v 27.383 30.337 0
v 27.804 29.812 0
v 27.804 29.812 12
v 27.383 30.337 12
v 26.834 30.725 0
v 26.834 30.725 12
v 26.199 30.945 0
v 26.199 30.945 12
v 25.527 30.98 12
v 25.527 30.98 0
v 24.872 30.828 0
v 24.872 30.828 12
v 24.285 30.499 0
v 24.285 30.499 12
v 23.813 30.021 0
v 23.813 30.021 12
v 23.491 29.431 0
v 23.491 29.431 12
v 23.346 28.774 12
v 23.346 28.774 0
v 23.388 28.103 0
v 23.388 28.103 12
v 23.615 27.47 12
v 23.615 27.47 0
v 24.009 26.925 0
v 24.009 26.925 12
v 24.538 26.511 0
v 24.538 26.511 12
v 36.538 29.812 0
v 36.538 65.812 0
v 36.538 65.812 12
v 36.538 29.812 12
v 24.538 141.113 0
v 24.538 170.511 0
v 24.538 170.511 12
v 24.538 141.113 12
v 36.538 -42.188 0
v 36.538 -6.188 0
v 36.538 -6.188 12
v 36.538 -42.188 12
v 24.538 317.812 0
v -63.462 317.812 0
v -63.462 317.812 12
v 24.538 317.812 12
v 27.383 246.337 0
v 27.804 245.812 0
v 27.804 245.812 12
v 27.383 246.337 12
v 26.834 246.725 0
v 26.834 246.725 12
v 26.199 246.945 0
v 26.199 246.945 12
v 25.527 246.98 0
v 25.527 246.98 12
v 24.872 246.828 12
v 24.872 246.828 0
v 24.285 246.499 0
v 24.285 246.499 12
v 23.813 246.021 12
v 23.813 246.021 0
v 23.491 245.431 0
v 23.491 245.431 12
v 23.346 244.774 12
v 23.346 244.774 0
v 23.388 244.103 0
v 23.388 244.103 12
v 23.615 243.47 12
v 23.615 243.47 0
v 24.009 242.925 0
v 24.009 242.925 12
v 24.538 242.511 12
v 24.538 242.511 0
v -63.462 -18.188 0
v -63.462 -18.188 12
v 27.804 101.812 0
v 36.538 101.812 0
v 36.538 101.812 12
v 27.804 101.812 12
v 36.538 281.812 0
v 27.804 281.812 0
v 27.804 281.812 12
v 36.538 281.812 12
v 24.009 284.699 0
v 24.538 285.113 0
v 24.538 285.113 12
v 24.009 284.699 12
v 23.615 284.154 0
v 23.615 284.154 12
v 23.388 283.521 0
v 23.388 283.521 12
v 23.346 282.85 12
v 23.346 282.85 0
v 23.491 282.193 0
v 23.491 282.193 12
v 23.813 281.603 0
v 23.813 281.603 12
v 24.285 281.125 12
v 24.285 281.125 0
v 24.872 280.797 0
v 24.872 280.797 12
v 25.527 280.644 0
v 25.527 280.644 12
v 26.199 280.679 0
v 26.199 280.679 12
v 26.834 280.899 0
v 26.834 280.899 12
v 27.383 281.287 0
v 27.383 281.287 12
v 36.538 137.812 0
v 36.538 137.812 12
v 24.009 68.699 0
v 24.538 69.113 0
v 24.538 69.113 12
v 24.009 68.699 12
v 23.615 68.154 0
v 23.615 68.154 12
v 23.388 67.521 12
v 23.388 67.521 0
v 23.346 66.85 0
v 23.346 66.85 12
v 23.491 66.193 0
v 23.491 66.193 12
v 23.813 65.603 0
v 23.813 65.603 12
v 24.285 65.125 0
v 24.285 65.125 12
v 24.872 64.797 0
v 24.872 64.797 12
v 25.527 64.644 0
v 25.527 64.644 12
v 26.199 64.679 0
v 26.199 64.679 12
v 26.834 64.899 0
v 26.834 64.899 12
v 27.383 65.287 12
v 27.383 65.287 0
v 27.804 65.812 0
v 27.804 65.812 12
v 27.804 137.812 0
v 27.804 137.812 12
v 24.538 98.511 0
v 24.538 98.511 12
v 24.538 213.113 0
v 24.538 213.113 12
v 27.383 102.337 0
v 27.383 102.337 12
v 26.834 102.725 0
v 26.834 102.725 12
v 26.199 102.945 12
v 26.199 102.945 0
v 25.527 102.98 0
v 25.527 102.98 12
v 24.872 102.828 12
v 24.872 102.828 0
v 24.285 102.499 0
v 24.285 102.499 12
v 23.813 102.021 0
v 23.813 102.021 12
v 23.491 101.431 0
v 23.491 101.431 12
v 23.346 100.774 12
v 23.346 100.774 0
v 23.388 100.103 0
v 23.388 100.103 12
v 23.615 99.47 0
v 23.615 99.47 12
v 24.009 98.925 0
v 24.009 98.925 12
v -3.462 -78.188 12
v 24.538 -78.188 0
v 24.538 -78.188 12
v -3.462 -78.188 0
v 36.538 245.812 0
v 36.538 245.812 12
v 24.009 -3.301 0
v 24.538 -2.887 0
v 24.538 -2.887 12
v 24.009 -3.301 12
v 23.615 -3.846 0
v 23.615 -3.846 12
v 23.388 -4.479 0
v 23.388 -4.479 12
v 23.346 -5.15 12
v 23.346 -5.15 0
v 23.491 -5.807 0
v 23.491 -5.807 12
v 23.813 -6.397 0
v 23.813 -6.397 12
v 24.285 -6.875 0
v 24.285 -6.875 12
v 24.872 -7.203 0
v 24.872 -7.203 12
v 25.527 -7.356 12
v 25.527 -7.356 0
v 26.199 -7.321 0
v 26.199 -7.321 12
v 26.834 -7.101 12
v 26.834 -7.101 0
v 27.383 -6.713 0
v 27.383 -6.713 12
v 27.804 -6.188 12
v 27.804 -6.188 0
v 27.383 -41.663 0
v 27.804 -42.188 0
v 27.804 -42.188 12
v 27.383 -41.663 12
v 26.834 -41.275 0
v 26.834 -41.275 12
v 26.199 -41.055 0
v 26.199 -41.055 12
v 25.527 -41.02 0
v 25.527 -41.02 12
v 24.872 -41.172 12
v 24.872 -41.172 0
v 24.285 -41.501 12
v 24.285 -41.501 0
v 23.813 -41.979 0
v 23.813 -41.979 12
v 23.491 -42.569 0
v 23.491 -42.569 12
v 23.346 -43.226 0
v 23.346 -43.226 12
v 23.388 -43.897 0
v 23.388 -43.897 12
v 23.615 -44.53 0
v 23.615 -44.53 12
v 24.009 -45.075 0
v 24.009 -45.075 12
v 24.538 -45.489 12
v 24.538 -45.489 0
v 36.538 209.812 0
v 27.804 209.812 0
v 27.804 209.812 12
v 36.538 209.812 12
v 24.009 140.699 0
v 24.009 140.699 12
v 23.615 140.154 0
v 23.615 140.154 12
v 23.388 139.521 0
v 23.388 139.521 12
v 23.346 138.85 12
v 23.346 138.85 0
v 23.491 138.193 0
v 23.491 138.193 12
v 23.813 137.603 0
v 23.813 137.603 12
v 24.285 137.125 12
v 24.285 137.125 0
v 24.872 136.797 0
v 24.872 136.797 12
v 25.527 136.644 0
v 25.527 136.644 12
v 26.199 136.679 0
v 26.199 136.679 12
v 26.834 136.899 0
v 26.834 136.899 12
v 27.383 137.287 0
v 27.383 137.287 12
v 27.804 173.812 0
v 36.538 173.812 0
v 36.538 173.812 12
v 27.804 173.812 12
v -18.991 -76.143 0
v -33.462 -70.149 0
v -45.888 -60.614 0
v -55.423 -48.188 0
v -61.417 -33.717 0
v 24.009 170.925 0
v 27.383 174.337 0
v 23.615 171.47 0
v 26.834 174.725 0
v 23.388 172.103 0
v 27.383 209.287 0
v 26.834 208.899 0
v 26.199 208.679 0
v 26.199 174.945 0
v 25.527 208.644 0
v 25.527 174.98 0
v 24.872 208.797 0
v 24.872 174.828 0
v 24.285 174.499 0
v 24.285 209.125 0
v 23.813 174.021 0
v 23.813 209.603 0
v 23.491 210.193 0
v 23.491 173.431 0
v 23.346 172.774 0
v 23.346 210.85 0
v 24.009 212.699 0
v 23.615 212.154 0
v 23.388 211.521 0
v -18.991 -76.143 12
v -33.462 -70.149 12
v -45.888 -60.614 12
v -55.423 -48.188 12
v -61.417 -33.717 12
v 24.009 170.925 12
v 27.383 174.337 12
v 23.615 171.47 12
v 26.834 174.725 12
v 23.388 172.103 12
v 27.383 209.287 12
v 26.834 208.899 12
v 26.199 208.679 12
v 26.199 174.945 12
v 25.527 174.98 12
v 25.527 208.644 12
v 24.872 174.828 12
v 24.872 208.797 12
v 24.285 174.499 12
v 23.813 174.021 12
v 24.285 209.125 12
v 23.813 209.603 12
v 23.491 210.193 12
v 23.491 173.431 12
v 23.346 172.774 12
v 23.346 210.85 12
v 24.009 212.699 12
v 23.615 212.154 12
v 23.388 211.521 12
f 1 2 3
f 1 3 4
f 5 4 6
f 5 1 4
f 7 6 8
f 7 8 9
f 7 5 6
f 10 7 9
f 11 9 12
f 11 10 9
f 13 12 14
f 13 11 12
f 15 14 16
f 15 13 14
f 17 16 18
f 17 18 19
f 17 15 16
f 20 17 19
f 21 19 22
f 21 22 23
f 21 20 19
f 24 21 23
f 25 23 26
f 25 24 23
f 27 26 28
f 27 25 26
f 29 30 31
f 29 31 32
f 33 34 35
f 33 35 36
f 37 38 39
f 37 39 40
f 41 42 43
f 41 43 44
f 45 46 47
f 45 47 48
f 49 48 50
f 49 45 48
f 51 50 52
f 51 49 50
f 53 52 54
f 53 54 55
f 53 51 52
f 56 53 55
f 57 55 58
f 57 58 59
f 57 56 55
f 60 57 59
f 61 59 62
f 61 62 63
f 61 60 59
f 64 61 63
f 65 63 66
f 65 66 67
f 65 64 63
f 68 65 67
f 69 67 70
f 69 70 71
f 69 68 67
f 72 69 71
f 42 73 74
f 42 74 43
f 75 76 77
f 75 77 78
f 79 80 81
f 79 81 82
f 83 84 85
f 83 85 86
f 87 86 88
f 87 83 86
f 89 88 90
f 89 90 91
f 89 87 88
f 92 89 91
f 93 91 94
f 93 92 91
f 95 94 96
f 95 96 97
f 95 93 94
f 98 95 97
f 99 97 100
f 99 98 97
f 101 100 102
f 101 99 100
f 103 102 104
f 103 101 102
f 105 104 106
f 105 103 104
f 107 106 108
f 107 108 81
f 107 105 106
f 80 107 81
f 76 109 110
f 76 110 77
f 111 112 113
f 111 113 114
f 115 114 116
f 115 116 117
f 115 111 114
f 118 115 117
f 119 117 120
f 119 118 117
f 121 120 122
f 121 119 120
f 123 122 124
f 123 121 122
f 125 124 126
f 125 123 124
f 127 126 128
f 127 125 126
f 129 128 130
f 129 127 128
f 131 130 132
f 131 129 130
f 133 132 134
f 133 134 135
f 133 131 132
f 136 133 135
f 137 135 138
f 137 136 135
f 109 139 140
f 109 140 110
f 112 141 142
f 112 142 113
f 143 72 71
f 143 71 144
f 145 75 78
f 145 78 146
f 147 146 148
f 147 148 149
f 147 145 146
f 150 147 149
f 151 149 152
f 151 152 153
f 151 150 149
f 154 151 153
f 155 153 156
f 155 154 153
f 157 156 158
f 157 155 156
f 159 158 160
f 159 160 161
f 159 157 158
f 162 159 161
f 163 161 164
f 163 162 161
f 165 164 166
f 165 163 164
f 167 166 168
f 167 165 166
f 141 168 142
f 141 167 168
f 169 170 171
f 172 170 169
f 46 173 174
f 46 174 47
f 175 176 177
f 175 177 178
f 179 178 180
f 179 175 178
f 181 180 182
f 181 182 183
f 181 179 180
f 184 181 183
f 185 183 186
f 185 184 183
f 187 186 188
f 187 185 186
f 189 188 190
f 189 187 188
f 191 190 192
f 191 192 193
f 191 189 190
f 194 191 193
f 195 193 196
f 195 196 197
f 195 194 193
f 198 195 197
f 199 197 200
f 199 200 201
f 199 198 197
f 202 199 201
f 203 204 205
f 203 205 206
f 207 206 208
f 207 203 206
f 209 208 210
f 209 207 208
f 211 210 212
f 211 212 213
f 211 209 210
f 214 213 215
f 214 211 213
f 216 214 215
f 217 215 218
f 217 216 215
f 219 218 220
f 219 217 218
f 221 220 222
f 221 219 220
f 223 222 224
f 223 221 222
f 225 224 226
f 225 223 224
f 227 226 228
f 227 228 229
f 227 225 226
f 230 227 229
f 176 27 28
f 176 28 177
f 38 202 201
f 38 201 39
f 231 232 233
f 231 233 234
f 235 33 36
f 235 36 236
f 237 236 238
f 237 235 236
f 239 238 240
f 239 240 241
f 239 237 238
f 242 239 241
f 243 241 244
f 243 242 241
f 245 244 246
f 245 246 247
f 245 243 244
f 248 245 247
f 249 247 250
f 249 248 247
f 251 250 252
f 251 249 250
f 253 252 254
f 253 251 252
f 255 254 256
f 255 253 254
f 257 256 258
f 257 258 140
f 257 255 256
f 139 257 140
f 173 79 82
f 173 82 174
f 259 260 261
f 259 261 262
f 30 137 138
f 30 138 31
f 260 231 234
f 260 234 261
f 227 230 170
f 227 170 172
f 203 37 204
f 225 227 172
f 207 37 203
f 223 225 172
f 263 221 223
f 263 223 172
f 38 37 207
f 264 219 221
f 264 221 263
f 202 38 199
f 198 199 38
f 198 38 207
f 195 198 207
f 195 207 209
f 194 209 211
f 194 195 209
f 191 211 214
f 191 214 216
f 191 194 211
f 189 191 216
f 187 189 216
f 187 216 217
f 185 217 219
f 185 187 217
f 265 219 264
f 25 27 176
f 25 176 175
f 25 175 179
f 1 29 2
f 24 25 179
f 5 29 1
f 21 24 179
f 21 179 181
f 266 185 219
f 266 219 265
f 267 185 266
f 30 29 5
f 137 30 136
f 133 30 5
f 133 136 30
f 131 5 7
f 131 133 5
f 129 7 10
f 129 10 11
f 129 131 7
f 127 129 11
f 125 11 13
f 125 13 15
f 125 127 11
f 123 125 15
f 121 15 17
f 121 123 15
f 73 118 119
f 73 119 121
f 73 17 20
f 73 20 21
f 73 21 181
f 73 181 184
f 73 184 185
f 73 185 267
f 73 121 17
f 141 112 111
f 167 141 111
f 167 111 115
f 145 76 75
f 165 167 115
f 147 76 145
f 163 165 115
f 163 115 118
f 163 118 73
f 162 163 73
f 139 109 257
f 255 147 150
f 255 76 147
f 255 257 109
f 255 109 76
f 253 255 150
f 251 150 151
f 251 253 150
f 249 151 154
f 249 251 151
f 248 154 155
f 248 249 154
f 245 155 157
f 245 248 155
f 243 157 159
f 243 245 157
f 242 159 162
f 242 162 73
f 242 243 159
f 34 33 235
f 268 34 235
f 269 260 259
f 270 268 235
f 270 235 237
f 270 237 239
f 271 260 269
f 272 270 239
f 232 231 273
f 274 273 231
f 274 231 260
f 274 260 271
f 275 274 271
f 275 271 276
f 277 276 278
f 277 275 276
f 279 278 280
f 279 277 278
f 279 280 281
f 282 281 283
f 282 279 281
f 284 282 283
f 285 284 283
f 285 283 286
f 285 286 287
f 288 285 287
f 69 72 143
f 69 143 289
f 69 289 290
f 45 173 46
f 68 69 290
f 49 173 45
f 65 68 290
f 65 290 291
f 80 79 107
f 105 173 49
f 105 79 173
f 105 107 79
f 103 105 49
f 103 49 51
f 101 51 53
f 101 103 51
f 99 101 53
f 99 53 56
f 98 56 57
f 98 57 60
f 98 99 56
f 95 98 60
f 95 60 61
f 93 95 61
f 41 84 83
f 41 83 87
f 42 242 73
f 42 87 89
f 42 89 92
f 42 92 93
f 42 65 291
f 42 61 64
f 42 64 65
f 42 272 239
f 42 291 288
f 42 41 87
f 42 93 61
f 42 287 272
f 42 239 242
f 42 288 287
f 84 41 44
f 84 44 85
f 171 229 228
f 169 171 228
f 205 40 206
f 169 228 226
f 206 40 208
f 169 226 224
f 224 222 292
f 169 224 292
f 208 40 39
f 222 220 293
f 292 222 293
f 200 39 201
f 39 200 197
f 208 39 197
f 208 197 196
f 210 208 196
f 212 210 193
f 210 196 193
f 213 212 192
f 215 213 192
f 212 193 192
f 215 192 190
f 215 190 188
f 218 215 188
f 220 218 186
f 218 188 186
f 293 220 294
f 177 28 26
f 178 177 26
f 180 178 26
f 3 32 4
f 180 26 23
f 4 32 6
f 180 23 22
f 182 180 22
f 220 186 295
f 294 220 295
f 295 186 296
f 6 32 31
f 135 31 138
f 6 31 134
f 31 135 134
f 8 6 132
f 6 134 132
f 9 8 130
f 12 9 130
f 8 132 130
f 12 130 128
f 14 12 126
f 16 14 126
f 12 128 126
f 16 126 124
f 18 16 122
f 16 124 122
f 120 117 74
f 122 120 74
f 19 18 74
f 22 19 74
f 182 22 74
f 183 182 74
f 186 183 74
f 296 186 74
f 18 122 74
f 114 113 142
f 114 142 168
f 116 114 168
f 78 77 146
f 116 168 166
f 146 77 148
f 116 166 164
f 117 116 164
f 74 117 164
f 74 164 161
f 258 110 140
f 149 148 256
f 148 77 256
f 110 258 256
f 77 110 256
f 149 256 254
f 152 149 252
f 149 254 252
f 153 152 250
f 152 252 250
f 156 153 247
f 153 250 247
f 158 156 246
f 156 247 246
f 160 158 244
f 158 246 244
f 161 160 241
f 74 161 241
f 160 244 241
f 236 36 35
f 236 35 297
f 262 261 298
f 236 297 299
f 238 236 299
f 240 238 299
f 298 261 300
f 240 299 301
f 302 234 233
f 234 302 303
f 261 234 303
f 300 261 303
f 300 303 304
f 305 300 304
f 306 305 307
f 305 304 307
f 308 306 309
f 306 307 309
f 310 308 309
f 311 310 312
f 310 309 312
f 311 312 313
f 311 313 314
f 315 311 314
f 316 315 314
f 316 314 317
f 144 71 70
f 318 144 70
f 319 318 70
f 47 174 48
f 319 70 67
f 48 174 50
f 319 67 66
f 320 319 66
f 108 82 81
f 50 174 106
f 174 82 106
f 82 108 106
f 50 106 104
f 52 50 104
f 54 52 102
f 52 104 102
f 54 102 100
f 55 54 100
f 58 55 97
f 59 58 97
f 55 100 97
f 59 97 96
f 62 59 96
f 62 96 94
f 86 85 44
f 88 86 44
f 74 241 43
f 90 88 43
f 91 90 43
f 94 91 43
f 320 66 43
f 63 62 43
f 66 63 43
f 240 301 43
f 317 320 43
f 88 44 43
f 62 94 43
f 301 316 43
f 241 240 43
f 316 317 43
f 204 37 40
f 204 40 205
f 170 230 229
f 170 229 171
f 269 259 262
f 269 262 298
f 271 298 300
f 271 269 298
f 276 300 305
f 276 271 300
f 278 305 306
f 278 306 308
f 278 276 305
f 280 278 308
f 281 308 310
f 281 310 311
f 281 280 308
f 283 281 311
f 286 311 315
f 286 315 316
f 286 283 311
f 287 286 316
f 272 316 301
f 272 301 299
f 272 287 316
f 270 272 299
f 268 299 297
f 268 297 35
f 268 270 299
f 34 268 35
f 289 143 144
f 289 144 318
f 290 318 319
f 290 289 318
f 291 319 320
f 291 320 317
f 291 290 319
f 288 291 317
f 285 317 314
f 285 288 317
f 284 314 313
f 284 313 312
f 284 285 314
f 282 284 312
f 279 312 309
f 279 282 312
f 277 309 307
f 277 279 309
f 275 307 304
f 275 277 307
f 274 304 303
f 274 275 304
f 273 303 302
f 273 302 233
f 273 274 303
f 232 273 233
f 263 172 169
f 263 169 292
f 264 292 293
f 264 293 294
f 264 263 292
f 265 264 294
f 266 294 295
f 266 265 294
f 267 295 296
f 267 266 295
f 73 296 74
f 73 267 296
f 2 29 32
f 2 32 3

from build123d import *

# Parameters (mm, degrees)
BOSS_EXTRUDE1_DEPTH = 12


with BuildPart() as part:
    # Sketch1 → Boss-Extrude1 (new body)
    with BuildSketch(Plane.XY):
        with BuildLine():
            Line((36.538461538, -42.187912088), (27.803617527, -42.187912088))
            ThreePointArc((27.803617527, -42.187912088), (24.032111316, -41.72295633), (24.538461538, -45.489128447))
            Line((24.538461538, -45.489128447), (24.538461538, -78.187912088))
            Line((24.538461538, -78.187912088), (-3.461538462, -78.187912088))
            ThreePointArc((-3.461538462, -78.187912088), (-45.887945333, -60.614318959), (-63.461538462, -18.187912088))
            Line((-63.461538462, -18.187912088), (-63.461538462, 317.812087912))
            Line((-63.461538462, 317.812087912), (24.538461538, 317.812087912))
            Line((24.538461538, 317.812087912), (24.538461538, 285.113304271))
            ThreePointArc((24.538461538, 285.113304271), (24.032111316, 281.347132154), (27.803617527, 281.812087912))
            Line((27.803617527, 281.812087912), (36.538461538, 281.812087912))
            Line((36.538461538, 281.812087912), (36.538461538, 245.812087912))
            Line((36.538461538, 245.812087912), (27.803617527, 245.812087912))
            ThreePointArc((27.803617527, 245.812087912), (24.032111316, 246.27704367), (24.538461538, 242.510871553))
            Line((24.538461538, 242.510871553), (24.538461538, 213.113304271))
            ThreePointArc((24.538461538, 213.113304271), (24.032111316, 209.347132154), (27.803617527, 209.812087912))
            Line((27.803617527, 209.812087912), (36.538461538, 209.812087912))
            Line((36.538461538, 209.812087912), (36.538461538, 173.812087912))
            Line((36.538461538, 173.812087912), (27.803617527, 173.812087912))
            ThreePointArc((27.803617527, 173.812087912), (24.032111316, 174.27704367), (24.538461538, 170.510871553))
            Line((24.538461538, 170.510871553), (24.538461538, 164.212087912))
            Line((24.538461538, 164.212087912), (24.538461538, 141.113304271))
            ThreePointArc((24.538461538, 141.113304271), (24.032111316, 137.347132154), (27.803617527, 137.812087912))
            Line((27.803617527, 137.812087912), (36.538461538, 137.812087912))
            Line((36.538461538, 137.812087912), (36.538461538, 119.812087912))
            Line((36.538461538, 119.812087912), (36.538461538, 101.812087912))
            Line((36.538461538, 101.812087912), (27.803617527, 101.812087912))
            ThreePointArc((27.803617527, 101.812087912), (24.032111316, 102.27704367), (24.538461538, 98.510871553))
            Line((24.538461538, 98.510871553), (24.538461538, 75.412087912))
            Line((24.538461538, 75.412087912), (24.538461538, 69.113304271))
            ThreePointArc((24.538461538, 69.113304271), (24.032111316, 65.347132154), (27.803617527, 65.812087912))
            Line((27.803617527, 65.812087912), (36.538461538, 65.812087912))
            Line((36.538461538, 65.812087912), (36.538461538, 29.812087912))
            Line((36.538461538, 29.812087912), (27.803617527, 29.812087912))
            ThreePointArc((27.803617527, 29.812087912), (24.032111316, 30.27704367), (24.538461538, 26.510871553))
            Line((24.538461538, 26.510871553), (24.538461538, -2.886695729))
            ThreePointArc((24.538461538, -2.886695729), (24.032111316, -6.652867846), (27.803617527, -6.187912088))
            Line((27.803617527, -6.187912088), (36.538461538, -6.187912088))
            Line((36.538461538, -6.187912088), (36.538461538, -42.187912088))
        make_face()
    extrude(amount=BOSS_EXTRUDE1_DEPTH)


solid = part.part
